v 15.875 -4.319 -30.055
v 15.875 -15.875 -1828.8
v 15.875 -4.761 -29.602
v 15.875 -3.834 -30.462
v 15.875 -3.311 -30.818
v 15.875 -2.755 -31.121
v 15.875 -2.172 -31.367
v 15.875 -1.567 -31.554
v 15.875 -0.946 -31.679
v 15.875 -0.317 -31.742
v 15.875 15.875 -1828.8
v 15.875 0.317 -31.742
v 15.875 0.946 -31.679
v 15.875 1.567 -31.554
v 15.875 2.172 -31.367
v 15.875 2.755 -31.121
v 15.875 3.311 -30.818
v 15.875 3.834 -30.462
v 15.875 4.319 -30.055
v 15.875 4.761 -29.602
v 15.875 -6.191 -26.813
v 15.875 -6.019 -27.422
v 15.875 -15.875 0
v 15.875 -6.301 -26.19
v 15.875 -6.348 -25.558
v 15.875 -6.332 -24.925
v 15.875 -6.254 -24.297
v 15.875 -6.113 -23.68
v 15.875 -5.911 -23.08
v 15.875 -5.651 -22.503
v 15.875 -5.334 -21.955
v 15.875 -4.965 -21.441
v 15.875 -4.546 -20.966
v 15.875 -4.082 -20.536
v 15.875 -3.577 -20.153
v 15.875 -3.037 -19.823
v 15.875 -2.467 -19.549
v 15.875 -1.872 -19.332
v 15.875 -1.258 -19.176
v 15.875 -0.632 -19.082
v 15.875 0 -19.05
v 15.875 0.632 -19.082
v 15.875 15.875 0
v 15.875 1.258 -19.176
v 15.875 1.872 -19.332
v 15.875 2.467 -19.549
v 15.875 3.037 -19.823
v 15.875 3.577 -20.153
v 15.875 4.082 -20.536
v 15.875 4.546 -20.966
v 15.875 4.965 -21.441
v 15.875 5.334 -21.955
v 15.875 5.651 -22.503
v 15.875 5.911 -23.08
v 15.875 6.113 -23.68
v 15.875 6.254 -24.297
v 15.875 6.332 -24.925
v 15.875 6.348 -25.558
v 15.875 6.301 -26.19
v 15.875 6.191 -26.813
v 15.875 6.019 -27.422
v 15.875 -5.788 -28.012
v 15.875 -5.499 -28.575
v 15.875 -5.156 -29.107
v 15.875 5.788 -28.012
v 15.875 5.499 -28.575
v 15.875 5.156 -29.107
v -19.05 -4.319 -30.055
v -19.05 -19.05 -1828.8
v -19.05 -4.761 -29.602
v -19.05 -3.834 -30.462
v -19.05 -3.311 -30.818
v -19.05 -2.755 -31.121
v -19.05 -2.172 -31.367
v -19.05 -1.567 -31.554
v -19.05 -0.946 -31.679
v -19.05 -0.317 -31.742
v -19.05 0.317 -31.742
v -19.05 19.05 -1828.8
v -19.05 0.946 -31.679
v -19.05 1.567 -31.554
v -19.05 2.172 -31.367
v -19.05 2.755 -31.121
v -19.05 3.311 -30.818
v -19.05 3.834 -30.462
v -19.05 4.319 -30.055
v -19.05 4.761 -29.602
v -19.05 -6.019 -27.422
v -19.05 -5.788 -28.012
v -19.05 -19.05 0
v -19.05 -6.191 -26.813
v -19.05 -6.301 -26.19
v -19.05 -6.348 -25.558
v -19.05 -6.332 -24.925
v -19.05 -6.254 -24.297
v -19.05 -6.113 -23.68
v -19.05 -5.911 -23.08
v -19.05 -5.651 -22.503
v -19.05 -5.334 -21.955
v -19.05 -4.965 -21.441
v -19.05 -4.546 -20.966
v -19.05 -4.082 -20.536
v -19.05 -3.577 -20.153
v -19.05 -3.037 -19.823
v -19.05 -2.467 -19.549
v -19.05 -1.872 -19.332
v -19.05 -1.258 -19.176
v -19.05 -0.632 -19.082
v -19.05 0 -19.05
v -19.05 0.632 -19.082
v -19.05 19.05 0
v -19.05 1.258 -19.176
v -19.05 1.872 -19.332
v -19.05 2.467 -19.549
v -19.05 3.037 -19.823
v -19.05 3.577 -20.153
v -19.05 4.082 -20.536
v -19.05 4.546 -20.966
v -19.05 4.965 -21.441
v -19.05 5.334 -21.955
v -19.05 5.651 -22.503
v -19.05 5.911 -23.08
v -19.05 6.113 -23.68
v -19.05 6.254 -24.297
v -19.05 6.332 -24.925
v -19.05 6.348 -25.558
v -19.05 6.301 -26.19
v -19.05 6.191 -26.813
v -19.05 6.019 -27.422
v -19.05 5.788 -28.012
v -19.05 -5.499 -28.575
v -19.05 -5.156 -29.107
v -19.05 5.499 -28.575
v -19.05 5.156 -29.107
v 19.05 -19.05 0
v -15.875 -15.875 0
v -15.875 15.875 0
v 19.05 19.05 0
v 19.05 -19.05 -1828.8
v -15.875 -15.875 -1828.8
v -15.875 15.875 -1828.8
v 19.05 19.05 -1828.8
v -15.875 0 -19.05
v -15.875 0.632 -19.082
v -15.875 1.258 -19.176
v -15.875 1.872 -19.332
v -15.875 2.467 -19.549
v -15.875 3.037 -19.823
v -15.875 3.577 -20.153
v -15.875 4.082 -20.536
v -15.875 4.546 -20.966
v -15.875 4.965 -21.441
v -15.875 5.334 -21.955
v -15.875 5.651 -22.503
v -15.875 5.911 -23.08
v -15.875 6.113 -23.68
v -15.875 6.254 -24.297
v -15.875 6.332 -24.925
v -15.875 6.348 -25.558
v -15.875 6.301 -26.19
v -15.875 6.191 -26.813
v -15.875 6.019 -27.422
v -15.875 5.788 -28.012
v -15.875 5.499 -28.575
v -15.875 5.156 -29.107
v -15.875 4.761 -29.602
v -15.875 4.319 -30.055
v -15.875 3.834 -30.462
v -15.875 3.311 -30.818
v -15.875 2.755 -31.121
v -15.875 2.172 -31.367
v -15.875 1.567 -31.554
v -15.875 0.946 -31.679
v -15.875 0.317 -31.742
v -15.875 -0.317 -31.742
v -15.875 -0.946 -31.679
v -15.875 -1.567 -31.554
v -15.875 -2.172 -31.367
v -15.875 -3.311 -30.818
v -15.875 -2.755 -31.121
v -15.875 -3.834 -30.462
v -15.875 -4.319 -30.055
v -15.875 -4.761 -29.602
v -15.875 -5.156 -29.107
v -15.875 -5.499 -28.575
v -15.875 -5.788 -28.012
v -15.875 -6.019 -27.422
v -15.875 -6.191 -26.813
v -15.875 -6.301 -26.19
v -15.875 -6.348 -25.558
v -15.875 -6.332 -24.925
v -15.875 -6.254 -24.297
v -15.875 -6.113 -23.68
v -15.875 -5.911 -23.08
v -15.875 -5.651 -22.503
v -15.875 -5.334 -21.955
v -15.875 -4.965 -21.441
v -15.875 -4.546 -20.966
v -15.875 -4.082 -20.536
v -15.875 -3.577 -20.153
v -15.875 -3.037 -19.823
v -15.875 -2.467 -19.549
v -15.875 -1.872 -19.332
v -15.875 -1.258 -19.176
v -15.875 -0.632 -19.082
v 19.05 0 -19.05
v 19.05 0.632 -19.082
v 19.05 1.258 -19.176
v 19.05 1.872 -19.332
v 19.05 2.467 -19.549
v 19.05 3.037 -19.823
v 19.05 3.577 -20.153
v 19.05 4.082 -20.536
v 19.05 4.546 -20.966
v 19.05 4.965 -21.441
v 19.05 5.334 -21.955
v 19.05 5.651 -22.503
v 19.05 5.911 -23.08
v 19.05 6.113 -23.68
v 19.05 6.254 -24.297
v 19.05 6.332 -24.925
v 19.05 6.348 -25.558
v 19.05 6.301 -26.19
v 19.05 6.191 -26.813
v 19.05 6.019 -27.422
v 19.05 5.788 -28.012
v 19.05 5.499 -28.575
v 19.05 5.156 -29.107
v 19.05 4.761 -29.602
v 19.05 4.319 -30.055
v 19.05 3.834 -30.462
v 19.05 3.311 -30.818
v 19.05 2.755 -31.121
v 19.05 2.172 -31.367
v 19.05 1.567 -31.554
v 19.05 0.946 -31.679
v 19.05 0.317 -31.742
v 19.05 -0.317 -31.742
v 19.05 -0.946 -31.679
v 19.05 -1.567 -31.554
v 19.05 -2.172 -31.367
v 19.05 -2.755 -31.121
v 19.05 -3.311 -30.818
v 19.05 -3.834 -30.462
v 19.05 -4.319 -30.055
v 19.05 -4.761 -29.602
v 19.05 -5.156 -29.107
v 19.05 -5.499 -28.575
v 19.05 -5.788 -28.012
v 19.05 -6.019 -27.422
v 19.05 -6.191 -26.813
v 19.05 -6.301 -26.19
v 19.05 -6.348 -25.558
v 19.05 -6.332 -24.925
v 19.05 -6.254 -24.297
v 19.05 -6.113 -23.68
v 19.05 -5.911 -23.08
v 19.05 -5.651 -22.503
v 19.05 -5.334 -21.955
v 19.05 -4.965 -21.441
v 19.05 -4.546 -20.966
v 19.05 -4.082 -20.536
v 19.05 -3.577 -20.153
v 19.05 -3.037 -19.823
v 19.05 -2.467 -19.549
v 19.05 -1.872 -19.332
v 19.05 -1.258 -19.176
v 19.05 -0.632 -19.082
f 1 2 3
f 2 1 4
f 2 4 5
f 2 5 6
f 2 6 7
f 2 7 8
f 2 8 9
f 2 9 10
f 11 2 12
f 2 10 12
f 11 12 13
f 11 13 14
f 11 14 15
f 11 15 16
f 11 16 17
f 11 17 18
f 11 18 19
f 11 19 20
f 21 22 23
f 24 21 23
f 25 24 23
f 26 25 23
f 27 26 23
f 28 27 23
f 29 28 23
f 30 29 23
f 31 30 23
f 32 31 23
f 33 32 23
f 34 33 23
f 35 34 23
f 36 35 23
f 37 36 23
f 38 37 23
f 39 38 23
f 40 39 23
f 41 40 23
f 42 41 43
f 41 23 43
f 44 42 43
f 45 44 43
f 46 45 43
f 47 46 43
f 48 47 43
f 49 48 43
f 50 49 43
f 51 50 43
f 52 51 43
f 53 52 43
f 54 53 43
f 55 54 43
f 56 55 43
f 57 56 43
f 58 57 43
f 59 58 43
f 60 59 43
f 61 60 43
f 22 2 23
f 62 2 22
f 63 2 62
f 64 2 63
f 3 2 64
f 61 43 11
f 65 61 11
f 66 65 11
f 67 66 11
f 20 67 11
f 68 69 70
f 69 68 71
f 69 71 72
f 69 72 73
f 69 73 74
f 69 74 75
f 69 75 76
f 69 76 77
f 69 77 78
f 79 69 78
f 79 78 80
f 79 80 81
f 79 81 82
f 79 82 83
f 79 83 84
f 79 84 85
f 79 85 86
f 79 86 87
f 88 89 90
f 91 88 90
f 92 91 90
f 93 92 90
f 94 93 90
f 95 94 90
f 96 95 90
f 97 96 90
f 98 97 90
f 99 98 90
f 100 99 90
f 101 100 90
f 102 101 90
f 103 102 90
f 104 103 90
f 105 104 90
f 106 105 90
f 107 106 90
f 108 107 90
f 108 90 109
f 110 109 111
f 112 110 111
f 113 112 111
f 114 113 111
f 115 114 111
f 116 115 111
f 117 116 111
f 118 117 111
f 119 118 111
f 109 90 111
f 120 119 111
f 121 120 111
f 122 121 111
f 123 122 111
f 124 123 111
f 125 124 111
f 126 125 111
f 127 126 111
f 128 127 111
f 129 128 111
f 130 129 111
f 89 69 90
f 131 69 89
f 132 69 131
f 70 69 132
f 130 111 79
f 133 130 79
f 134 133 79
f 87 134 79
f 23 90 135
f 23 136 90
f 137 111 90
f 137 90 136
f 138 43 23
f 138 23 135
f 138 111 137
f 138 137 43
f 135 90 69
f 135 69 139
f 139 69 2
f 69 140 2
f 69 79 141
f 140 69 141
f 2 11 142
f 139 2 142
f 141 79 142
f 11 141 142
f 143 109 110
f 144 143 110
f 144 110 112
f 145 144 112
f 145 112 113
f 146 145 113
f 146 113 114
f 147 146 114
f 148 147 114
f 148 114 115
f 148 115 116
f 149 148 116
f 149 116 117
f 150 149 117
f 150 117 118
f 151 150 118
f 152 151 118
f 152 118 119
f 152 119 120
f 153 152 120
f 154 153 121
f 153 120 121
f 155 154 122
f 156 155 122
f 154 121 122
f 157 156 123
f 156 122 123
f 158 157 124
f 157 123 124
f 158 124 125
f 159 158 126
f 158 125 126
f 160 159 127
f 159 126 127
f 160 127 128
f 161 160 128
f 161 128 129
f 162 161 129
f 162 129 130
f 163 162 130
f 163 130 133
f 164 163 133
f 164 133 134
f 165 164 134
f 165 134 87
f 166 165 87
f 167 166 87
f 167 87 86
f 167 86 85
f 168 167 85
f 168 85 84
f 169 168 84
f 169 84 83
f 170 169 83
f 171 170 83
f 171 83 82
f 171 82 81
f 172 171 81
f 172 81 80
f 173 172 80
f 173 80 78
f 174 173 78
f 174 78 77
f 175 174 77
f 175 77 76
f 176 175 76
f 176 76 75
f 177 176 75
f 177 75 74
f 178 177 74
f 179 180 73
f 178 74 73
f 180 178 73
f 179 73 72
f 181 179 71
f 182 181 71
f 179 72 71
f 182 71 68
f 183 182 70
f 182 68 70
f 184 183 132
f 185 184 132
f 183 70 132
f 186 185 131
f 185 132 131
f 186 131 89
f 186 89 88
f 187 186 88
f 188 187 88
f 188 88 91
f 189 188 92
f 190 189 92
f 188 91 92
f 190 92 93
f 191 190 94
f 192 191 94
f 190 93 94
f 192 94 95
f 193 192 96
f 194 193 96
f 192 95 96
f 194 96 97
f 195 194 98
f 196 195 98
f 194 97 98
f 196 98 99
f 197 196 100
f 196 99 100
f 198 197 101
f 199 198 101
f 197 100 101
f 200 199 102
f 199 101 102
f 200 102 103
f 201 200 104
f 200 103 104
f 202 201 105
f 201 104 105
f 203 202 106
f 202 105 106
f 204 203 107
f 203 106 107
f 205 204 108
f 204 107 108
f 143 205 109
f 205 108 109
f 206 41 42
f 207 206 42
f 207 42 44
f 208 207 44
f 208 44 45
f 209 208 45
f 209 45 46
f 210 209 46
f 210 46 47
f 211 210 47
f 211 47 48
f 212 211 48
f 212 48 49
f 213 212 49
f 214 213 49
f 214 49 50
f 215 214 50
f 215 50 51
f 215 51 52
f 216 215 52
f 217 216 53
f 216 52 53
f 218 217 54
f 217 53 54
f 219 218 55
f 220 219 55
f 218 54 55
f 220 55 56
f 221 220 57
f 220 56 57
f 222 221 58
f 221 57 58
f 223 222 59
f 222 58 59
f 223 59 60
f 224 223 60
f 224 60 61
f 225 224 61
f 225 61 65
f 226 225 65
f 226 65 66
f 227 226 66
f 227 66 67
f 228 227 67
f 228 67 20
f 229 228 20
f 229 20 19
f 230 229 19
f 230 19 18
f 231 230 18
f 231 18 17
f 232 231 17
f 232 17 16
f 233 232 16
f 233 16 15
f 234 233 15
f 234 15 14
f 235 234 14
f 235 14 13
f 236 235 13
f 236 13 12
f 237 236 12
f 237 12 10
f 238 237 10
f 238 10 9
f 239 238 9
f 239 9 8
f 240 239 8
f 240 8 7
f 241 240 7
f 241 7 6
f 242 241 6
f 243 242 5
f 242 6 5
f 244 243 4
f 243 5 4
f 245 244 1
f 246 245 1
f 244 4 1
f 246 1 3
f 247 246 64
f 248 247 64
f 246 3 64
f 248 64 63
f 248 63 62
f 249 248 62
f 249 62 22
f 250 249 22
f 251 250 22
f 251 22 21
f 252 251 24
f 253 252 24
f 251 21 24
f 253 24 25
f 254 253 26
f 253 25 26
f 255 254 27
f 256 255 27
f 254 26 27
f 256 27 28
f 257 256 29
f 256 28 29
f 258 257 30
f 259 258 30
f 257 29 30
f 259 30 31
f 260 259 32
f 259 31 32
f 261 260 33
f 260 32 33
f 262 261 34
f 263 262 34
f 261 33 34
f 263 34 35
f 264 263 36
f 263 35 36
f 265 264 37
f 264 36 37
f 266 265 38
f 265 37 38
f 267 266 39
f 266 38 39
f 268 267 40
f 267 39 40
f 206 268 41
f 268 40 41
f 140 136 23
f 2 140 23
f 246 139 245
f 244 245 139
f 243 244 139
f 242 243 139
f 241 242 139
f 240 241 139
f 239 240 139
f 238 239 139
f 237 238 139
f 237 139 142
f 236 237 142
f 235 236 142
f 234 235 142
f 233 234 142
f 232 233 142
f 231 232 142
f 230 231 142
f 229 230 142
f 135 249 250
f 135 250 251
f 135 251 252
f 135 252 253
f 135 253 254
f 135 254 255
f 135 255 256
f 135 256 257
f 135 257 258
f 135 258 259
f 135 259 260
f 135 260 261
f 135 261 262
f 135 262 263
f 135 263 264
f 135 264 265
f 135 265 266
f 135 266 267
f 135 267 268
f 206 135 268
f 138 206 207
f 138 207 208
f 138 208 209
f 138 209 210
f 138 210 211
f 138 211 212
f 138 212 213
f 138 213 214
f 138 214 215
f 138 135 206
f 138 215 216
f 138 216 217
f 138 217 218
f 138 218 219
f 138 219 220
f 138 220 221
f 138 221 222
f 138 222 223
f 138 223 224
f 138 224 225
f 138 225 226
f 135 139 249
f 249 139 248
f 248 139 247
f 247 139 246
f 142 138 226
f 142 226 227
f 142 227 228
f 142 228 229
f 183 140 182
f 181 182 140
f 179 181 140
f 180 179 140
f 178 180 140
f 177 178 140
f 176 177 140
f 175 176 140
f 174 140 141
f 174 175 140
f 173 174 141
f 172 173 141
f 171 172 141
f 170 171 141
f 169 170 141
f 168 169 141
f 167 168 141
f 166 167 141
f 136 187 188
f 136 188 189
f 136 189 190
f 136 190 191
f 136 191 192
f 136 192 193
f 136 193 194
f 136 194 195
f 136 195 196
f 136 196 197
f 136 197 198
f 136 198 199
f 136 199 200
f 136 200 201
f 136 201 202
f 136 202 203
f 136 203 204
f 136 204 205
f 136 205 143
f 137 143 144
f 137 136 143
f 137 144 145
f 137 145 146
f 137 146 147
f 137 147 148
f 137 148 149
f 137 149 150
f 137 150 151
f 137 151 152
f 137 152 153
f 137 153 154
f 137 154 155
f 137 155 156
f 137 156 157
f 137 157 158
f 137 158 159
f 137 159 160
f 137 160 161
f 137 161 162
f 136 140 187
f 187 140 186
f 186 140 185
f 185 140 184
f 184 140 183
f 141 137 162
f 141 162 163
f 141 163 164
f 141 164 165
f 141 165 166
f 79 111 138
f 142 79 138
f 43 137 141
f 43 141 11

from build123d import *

# Parameters (mm, degrees)
SKETCH1_W           = 38.1
SKETCH1_H           = 38.1
SKETCH1_W_2         = 31.75
SKETCH1_H_2         = 31.75
BOSS_EXTRUDE1_DEPTH = 1828.8
SKETCH2_R           = 6.35
CUT_EXTRUDE1_DEPTH  = 38.1


with BuildPart() as part:
    # Sketch1 → Boss-Extrude1 (new body)
    with BuildSketch(Plane.XY):
        Rectangle(SKETCH1_W, SKETCH1_H)
        Rectangle(SKETCH1_W_2, SKETCH1_H_2, mode=Mode.SUBTRACT)
    extrude(amount=-BOSS_EXTRUDE1_DEPTH)

    # Sketch2 → Cut-Extrude1 (cut)
    with BuildSketch(Plane.ZY.offset(19.05)):
        with Locations((-25.4, 0)):
            Circle(SKETCH2_R)
    extrude(amount=-CUT_EXTRUDE1_DEPTH, mode=Mode.SUBTRACT)


solid = part.part
